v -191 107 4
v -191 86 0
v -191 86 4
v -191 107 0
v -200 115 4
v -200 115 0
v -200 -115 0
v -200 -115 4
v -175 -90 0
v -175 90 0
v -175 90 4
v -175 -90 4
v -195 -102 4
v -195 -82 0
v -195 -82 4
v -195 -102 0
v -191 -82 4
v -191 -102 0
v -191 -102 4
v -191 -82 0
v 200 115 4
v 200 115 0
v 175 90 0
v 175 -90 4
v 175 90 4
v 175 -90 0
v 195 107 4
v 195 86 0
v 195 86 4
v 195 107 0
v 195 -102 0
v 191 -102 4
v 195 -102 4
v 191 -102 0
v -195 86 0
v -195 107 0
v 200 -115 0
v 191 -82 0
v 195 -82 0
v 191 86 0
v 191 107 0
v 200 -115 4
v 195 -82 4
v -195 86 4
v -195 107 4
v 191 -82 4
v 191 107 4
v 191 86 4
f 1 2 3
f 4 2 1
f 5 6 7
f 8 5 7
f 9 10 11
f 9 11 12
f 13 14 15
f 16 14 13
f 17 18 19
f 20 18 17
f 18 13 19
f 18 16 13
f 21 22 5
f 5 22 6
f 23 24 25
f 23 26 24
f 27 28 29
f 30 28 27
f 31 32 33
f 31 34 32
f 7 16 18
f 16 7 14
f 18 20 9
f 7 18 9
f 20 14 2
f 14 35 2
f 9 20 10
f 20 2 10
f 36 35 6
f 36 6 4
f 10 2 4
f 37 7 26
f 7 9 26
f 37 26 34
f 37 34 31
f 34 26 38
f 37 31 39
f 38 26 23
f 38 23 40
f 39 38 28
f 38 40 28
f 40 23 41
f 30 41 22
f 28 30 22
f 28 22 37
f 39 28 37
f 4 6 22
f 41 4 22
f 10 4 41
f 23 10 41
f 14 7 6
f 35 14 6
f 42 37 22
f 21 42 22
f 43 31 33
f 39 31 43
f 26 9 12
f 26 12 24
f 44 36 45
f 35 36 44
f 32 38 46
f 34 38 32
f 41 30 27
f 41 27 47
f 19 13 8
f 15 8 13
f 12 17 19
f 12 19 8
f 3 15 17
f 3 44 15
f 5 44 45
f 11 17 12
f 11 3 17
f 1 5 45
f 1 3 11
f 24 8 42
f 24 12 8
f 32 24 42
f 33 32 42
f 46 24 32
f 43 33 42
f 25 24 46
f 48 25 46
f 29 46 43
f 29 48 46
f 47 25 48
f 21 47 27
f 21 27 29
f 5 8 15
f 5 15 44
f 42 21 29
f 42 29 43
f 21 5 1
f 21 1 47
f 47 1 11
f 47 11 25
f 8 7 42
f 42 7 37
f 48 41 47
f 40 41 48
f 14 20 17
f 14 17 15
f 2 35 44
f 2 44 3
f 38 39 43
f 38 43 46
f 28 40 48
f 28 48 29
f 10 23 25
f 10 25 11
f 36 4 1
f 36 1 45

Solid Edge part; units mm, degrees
sketch "Sketch1" plane through (0, 0, 0) normal (0, 0, 1) x (1, 0, 0)
  line L0 (191, 107) -> (191, 86)
  line L1 (191, 86) -> (195, 86)
  line L2 (195, 86) -> (195, 107)
  line L3 (195, 107) -> (191, 107)
  line L4 (-195, -82) -> (-195, -102)
  line L5 (-195, -102) -> (-191, -102)
  line L6 (-191, -102) -> (-191, -82)
  line L7 (-191, -82) -> (-195, -82)
  line L8 (-195, 107) -> (-195, 86)
  line L9 (-195, 86) -> (-191, 86)
  line L10 (-191, 86) -> (-191, 107)
  line L11 (-191, 107) -> (-195, 107)
  line L12 (195, -82) -> (191, -82)
  line L13 (191, -82) -> (191, -102)
  line L14 (191, -102) -> (195, -102)
  line L15 (195, -102) -> (195, -82)
  line L16 (200, 115) -> (-200, 115)
  line L17 (-200, 115) -> (-200, -115)
  line L18 (-200, -115) -> (200, -115)
  line L19 (200, -115) -> (200, 115)
  line L20 (175, 90) -> (-175, 90)
  line L21 (-175, 90) -> (-175, -90)
  line L22 (-175, -90) -> (175, -90)
  line L23 (175, -90) -> (175, 90)
  dimension "D1" = 21
  dimension "D2" = 20
  dimension "D3" = 5
  dimension "D4" = 4
  dimension "D5" = 4
  dimension "D6" = 5
  dimension "D7" = 20
  dimension "D8" = 4
  dimension "D9" = 5
  dimension "D10" = 21
  dimension "D11" = 4
  dimension "D12" = 5
  dimension "D13" = 13
  dimension "D14" = 13
  dimension "D15" = 8
  dimension "D16" = 8
  dimension "D17" = 400
  dimension "D18" = 230
extrude "Protrusion1" add sketch "Sketch1" along normal blind 4
